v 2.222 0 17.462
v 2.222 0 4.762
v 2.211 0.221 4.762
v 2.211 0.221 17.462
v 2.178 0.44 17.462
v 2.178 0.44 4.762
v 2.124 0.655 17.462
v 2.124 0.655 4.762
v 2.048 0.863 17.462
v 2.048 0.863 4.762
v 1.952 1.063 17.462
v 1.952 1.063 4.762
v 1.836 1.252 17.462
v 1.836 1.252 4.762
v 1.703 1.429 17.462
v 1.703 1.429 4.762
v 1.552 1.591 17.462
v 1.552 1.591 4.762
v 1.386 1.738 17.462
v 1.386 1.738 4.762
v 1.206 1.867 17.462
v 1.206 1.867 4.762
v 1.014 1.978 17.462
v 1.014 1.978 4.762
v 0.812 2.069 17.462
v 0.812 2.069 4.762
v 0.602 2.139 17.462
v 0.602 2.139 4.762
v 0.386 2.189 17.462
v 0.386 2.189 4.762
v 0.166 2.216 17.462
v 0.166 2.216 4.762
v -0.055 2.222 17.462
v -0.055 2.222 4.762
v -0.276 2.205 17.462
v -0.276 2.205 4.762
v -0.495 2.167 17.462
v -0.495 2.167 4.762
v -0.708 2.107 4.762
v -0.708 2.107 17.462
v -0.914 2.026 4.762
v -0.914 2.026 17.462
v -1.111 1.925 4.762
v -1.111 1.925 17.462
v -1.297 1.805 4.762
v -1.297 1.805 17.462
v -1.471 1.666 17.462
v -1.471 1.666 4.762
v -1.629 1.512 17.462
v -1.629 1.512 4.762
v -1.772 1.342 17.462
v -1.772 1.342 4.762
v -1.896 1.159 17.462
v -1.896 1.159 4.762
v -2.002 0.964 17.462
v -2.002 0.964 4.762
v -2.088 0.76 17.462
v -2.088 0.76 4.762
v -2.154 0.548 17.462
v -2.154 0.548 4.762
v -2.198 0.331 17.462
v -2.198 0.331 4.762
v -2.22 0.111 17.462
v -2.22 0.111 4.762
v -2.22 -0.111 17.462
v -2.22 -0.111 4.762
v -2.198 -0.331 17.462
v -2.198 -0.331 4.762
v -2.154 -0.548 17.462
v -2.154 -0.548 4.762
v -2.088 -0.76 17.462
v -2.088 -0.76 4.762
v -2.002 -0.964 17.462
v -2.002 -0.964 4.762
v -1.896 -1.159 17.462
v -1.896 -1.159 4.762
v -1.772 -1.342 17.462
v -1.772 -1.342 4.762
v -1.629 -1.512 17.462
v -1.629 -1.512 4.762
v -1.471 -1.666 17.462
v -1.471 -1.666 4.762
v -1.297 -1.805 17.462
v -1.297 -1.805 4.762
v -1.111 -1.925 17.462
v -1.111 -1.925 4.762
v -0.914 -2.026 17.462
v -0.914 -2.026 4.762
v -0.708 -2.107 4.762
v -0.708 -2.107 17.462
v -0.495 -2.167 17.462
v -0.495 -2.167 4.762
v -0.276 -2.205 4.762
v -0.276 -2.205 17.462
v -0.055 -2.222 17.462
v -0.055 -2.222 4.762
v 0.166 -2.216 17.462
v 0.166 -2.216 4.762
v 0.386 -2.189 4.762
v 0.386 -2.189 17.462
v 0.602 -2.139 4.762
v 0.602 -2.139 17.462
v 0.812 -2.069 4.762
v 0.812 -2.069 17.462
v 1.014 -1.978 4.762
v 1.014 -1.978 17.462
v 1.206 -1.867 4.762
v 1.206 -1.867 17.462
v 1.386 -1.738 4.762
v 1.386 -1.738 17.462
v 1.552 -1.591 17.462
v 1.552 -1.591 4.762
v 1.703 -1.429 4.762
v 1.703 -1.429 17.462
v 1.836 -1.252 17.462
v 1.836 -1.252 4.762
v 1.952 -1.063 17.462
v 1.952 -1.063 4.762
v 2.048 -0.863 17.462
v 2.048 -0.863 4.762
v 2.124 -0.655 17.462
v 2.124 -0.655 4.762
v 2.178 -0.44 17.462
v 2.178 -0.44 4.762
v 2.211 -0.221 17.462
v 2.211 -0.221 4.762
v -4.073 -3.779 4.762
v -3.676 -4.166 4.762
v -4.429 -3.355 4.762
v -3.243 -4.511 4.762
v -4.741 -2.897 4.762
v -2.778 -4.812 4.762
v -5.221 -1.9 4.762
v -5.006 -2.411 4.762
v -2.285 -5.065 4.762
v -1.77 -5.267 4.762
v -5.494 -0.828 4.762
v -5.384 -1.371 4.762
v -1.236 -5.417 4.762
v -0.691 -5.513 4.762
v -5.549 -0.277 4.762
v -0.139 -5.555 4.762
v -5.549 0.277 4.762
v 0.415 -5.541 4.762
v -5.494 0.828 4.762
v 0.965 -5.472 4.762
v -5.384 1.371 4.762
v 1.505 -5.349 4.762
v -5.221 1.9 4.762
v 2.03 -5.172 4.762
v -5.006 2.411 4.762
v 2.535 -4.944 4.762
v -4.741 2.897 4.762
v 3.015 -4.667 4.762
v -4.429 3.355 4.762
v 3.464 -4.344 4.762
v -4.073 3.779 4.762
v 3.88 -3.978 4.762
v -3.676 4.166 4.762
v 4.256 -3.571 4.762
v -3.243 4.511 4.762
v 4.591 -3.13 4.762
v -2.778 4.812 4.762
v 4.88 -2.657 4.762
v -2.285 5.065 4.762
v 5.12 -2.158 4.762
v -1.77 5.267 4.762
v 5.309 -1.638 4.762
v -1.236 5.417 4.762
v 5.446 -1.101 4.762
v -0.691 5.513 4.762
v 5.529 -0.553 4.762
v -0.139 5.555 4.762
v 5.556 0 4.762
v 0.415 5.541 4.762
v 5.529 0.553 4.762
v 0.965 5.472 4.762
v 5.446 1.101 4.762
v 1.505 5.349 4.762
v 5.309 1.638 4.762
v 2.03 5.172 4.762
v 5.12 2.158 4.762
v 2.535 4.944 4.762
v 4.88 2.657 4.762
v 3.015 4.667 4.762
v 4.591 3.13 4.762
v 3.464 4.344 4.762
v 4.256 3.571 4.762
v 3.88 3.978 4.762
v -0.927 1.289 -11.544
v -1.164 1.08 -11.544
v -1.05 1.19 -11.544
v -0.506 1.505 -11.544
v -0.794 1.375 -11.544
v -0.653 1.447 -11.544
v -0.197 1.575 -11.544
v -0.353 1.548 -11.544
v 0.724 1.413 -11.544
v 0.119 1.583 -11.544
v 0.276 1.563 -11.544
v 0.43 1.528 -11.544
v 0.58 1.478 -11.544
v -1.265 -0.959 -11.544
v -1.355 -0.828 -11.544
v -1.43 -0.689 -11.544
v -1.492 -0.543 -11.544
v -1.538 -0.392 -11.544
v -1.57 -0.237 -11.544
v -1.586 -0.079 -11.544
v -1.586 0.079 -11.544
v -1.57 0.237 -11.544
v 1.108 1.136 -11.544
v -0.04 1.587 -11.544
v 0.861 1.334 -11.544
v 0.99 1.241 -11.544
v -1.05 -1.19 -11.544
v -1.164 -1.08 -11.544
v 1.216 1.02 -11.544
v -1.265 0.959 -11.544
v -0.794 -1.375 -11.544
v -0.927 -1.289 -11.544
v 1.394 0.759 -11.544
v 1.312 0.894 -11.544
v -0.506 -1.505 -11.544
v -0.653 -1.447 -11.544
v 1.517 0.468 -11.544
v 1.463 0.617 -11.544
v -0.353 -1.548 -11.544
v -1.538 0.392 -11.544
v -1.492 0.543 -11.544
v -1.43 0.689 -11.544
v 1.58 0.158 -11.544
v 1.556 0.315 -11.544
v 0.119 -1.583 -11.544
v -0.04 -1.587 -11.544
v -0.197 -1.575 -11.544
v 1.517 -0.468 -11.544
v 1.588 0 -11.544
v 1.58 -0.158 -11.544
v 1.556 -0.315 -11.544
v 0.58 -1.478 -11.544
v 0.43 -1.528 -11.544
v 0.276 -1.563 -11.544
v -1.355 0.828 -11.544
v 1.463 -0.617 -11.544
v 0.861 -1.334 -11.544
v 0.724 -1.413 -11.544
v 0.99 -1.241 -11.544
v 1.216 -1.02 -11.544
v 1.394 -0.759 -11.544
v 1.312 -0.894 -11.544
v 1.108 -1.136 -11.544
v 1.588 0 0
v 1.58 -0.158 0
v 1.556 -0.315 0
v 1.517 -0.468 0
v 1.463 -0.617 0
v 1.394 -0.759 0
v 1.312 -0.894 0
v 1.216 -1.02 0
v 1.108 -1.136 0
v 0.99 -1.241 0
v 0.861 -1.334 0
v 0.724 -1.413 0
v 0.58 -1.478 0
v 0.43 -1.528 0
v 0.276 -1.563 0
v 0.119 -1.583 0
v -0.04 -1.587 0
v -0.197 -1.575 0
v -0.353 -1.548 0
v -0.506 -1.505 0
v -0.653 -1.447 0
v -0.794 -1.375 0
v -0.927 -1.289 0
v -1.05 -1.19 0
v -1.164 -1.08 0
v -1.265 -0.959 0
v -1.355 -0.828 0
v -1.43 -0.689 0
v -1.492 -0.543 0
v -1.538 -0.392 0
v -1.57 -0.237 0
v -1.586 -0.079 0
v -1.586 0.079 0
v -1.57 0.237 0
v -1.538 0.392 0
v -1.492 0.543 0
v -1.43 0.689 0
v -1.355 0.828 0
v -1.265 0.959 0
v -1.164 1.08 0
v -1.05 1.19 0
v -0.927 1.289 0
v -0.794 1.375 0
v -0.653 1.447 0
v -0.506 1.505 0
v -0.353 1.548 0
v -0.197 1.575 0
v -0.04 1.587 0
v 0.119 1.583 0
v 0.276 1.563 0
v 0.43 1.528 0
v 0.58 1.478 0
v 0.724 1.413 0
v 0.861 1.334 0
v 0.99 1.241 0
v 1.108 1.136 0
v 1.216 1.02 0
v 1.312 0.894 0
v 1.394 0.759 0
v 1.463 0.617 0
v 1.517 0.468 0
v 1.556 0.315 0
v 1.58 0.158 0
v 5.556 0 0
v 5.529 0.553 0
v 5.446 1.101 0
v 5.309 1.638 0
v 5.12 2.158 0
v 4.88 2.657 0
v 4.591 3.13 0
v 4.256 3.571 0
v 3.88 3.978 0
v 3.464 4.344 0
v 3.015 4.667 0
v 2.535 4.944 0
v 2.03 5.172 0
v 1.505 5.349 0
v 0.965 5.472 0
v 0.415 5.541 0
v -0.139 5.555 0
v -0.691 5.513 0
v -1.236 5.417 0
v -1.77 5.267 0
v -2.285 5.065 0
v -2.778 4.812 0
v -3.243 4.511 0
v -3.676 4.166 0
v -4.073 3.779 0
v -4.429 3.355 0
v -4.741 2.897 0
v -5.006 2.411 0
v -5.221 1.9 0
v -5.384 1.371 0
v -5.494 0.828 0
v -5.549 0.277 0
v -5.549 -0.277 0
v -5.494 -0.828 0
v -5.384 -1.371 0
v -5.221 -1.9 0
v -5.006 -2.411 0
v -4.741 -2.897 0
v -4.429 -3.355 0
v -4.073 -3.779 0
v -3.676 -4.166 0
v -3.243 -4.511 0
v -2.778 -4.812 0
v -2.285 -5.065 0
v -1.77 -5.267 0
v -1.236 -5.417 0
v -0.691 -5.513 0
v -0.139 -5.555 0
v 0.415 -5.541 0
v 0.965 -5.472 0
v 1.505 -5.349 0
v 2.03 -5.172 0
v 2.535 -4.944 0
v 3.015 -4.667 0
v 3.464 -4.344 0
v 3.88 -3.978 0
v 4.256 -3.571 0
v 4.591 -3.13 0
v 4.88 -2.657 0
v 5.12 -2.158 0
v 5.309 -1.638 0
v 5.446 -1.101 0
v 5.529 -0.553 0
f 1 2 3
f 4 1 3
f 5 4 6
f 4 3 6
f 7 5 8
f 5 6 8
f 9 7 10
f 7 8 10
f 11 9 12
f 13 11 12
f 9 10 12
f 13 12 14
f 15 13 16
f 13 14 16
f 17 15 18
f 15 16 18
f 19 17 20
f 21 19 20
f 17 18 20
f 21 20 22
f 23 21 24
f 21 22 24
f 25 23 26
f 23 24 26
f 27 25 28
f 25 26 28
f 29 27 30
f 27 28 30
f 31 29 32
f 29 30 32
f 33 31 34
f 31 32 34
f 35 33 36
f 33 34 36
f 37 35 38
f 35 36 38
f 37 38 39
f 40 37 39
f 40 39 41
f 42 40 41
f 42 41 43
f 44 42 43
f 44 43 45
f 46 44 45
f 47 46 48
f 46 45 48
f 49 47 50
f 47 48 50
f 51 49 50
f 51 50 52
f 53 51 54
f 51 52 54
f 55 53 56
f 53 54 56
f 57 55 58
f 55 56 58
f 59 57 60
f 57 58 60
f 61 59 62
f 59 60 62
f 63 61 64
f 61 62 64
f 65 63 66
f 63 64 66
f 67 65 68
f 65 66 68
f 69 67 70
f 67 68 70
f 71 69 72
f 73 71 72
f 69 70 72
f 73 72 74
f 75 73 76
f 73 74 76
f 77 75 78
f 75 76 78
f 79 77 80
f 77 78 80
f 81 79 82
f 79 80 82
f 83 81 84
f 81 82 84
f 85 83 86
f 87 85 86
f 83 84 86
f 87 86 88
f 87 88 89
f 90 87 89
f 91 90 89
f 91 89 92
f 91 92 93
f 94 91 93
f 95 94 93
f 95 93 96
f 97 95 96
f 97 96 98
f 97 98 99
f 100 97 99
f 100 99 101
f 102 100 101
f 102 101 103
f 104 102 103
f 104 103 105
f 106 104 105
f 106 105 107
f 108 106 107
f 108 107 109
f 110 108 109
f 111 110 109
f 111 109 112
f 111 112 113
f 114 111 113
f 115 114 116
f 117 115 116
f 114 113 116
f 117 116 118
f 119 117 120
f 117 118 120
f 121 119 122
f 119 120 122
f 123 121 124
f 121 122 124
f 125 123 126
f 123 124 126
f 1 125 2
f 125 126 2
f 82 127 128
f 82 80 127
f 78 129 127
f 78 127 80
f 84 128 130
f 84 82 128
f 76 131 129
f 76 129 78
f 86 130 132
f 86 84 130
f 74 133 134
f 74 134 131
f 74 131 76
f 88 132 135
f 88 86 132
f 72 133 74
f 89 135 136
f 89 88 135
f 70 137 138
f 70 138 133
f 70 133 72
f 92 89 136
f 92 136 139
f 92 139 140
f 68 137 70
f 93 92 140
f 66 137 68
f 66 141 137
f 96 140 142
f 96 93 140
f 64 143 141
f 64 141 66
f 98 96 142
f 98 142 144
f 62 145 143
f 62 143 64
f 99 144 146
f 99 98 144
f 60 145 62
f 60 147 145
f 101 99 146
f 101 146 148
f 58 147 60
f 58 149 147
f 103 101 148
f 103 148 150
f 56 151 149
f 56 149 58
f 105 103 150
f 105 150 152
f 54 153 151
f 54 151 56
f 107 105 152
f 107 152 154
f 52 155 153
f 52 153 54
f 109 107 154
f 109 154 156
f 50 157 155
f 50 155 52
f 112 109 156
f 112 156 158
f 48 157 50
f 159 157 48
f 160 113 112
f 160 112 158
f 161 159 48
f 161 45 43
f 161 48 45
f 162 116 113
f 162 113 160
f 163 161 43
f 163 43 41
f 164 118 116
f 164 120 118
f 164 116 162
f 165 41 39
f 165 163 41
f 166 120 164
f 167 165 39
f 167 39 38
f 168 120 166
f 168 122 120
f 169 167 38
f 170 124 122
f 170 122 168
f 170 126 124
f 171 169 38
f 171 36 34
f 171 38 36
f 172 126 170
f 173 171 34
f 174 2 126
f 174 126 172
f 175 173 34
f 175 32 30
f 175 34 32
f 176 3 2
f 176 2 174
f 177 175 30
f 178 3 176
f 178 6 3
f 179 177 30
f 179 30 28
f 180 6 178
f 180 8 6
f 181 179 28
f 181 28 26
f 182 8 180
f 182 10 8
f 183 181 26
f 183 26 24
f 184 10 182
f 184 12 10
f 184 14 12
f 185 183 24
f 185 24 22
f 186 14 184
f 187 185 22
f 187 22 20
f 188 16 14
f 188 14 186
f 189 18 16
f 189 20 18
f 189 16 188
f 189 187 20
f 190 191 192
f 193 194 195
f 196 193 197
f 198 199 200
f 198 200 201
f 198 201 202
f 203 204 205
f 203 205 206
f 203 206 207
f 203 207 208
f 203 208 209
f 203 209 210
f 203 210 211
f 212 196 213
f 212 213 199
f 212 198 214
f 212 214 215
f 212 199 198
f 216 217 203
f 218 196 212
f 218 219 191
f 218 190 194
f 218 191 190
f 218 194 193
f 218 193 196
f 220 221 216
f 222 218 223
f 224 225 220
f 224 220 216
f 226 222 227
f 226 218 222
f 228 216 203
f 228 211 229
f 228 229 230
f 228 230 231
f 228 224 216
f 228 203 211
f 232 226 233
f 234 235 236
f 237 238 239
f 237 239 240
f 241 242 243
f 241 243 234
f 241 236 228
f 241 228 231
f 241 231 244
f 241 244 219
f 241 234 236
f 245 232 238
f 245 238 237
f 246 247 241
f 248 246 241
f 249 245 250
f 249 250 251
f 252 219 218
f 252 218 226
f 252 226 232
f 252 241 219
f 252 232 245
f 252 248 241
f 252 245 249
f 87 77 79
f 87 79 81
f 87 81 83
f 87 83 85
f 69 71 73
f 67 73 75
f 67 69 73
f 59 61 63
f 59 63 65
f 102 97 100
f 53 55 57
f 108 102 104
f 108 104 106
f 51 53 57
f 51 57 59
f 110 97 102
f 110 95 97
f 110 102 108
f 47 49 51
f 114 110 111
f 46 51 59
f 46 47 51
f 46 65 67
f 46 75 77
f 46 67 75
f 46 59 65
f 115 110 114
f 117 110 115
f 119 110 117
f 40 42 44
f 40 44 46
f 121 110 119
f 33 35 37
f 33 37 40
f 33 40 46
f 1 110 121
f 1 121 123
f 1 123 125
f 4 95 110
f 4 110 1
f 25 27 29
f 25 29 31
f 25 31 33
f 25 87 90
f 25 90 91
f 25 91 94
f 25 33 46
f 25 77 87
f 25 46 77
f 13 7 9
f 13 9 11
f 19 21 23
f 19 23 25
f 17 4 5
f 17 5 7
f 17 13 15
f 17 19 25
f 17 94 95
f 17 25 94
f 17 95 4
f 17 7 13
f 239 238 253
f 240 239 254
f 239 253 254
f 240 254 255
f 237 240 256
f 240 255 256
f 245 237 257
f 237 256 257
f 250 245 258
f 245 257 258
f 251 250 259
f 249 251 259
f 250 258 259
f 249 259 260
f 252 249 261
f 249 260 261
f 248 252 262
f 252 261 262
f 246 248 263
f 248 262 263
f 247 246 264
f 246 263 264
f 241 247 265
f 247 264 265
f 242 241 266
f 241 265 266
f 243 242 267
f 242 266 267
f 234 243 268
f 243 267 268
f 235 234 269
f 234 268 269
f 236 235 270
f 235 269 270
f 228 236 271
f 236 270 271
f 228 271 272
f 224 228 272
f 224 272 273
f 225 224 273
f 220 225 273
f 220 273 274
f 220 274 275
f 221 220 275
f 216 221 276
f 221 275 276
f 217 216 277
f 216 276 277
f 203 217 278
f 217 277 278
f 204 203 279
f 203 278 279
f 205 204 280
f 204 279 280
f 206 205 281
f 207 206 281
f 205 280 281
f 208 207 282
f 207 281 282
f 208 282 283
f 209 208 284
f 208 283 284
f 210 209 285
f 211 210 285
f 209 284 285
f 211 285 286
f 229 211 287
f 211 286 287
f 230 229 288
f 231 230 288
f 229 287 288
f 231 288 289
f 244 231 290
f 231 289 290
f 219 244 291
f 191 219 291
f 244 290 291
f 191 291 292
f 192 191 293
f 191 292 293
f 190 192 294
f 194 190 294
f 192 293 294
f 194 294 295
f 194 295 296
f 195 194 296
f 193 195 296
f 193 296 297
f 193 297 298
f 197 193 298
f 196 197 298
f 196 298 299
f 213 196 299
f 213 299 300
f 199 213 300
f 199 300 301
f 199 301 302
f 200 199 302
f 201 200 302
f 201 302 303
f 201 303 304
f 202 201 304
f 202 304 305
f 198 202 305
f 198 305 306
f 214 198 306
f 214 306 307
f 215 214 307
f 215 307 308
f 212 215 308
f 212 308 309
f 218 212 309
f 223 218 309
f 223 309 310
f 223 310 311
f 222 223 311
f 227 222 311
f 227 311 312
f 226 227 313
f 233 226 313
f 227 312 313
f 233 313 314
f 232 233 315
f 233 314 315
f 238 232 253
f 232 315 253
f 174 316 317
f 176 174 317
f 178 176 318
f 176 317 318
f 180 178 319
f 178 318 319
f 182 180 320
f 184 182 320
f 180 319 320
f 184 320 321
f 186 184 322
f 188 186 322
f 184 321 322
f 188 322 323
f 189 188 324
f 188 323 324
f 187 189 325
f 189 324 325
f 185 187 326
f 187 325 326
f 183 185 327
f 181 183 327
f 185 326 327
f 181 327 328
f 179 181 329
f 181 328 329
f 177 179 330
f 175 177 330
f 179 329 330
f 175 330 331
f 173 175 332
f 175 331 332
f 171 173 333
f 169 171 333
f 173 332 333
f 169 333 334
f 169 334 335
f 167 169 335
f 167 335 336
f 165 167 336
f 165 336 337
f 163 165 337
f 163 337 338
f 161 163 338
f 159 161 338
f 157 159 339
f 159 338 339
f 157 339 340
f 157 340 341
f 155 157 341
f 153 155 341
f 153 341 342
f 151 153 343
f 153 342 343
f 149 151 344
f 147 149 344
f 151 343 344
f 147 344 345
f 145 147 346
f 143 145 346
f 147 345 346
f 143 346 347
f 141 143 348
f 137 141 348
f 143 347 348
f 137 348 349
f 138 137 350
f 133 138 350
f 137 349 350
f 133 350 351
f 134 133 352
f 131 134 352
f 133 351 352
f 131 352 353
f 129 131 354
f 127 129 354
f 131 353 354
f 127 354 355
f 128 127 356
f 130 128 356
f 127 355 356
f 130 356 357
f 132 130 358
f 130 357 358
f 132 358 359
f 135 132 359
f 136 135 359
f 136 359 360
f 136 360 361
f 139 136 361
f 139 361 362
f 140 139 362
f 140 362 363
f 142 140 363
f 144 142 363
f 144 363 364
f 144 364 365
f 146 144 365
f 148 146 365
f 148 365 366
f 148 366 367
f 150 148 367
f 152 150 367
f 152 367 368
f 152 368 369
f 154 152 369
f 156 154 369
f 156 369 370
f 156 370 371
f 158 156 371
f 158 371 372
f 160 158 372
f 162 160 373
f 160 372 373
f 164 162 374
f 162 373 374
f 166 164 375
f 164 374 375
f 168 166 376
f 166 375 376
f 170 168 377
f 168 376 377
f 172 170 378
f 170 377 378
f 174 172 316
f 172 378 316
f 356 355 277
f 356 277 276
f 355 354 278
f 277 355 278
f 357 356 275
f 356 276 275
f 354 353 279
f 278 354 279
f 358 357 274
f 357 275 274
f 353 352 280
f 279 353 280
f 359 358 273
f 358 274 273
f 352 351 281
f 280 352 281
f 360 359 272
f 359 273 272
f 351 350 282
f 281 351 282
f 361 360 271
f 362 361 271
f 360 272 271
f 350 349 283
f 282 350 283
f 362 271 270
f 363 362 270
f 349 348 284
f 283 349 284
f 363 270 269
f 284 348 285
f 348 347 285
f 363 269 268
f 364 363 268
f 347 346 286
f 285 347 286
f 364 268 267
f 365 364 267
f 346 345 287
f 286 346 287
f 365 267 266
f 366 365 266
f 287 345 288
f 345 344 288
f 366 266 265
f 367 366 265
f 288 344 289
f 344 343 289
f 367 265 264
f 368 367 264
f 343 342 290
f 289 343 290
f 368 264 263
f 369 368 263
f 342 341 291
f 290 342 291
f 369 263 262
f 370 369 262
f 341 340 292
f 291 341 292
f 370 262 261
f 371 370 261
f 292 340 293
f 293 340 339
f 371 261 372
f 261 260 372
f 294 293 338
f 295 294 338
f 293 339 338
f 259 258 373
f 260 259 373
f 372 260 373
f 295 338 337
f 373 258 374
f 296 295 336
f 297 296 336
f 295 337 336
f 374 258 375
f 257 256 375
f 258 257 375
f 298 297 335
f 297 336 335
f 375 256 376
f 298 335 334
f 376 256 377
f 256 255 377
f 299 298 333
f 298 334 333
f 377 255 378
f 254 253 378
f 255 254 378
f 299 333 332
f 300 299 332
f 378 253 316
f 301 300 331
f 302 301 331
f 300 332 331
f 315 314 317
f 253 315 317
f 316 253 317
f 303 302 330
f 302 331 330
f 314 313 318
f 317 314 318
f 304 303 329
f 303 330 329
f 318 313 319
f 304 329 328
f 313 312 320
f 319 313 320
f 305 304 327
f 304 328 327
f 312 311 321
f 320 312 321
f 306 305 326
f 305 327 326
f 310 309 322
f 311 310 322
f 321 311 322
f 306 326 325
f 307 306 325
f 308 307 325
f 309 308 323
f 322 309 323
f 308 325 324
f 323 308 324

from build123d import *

# Parameters (mm, degrees)
F0_R     = 5.55625
F1_DEPTH = 4.7625
F2_R     = 2.2225
F3_DEPTH = 12.7
F4_R     = 1.5875
F5_DEPTH = 11.5443


# Not quite as in the source:
# - a length typed as a fraction of an inch, garbled in the dataset ("3 / 203.2 mm" for 3/8 in), is restored


with BuildPart() as f1:
    # F0 (on Top) → F1 (new body)
    with BuildSketch(Plane.XY):
        Circle(F0_R)
    extrude(amount=F1_DEPTH)

    # F2 (on face) → F3 (join)
    with BuildSketch(Plane.XY.offset(4.7625)):
        Circle(F2_R)
    extrude(amount=F3_DEPTH)

    # F4 (on face) → F5 (join)
    with BuildSketch(Plane(origin=(0, 0, 0), x_dir=(1, 0, 0), z_dir=(0, 0, -1))):
        Circle(F4_R)
    extrude(amount=F5_DEPTH)


solid = f1.part
